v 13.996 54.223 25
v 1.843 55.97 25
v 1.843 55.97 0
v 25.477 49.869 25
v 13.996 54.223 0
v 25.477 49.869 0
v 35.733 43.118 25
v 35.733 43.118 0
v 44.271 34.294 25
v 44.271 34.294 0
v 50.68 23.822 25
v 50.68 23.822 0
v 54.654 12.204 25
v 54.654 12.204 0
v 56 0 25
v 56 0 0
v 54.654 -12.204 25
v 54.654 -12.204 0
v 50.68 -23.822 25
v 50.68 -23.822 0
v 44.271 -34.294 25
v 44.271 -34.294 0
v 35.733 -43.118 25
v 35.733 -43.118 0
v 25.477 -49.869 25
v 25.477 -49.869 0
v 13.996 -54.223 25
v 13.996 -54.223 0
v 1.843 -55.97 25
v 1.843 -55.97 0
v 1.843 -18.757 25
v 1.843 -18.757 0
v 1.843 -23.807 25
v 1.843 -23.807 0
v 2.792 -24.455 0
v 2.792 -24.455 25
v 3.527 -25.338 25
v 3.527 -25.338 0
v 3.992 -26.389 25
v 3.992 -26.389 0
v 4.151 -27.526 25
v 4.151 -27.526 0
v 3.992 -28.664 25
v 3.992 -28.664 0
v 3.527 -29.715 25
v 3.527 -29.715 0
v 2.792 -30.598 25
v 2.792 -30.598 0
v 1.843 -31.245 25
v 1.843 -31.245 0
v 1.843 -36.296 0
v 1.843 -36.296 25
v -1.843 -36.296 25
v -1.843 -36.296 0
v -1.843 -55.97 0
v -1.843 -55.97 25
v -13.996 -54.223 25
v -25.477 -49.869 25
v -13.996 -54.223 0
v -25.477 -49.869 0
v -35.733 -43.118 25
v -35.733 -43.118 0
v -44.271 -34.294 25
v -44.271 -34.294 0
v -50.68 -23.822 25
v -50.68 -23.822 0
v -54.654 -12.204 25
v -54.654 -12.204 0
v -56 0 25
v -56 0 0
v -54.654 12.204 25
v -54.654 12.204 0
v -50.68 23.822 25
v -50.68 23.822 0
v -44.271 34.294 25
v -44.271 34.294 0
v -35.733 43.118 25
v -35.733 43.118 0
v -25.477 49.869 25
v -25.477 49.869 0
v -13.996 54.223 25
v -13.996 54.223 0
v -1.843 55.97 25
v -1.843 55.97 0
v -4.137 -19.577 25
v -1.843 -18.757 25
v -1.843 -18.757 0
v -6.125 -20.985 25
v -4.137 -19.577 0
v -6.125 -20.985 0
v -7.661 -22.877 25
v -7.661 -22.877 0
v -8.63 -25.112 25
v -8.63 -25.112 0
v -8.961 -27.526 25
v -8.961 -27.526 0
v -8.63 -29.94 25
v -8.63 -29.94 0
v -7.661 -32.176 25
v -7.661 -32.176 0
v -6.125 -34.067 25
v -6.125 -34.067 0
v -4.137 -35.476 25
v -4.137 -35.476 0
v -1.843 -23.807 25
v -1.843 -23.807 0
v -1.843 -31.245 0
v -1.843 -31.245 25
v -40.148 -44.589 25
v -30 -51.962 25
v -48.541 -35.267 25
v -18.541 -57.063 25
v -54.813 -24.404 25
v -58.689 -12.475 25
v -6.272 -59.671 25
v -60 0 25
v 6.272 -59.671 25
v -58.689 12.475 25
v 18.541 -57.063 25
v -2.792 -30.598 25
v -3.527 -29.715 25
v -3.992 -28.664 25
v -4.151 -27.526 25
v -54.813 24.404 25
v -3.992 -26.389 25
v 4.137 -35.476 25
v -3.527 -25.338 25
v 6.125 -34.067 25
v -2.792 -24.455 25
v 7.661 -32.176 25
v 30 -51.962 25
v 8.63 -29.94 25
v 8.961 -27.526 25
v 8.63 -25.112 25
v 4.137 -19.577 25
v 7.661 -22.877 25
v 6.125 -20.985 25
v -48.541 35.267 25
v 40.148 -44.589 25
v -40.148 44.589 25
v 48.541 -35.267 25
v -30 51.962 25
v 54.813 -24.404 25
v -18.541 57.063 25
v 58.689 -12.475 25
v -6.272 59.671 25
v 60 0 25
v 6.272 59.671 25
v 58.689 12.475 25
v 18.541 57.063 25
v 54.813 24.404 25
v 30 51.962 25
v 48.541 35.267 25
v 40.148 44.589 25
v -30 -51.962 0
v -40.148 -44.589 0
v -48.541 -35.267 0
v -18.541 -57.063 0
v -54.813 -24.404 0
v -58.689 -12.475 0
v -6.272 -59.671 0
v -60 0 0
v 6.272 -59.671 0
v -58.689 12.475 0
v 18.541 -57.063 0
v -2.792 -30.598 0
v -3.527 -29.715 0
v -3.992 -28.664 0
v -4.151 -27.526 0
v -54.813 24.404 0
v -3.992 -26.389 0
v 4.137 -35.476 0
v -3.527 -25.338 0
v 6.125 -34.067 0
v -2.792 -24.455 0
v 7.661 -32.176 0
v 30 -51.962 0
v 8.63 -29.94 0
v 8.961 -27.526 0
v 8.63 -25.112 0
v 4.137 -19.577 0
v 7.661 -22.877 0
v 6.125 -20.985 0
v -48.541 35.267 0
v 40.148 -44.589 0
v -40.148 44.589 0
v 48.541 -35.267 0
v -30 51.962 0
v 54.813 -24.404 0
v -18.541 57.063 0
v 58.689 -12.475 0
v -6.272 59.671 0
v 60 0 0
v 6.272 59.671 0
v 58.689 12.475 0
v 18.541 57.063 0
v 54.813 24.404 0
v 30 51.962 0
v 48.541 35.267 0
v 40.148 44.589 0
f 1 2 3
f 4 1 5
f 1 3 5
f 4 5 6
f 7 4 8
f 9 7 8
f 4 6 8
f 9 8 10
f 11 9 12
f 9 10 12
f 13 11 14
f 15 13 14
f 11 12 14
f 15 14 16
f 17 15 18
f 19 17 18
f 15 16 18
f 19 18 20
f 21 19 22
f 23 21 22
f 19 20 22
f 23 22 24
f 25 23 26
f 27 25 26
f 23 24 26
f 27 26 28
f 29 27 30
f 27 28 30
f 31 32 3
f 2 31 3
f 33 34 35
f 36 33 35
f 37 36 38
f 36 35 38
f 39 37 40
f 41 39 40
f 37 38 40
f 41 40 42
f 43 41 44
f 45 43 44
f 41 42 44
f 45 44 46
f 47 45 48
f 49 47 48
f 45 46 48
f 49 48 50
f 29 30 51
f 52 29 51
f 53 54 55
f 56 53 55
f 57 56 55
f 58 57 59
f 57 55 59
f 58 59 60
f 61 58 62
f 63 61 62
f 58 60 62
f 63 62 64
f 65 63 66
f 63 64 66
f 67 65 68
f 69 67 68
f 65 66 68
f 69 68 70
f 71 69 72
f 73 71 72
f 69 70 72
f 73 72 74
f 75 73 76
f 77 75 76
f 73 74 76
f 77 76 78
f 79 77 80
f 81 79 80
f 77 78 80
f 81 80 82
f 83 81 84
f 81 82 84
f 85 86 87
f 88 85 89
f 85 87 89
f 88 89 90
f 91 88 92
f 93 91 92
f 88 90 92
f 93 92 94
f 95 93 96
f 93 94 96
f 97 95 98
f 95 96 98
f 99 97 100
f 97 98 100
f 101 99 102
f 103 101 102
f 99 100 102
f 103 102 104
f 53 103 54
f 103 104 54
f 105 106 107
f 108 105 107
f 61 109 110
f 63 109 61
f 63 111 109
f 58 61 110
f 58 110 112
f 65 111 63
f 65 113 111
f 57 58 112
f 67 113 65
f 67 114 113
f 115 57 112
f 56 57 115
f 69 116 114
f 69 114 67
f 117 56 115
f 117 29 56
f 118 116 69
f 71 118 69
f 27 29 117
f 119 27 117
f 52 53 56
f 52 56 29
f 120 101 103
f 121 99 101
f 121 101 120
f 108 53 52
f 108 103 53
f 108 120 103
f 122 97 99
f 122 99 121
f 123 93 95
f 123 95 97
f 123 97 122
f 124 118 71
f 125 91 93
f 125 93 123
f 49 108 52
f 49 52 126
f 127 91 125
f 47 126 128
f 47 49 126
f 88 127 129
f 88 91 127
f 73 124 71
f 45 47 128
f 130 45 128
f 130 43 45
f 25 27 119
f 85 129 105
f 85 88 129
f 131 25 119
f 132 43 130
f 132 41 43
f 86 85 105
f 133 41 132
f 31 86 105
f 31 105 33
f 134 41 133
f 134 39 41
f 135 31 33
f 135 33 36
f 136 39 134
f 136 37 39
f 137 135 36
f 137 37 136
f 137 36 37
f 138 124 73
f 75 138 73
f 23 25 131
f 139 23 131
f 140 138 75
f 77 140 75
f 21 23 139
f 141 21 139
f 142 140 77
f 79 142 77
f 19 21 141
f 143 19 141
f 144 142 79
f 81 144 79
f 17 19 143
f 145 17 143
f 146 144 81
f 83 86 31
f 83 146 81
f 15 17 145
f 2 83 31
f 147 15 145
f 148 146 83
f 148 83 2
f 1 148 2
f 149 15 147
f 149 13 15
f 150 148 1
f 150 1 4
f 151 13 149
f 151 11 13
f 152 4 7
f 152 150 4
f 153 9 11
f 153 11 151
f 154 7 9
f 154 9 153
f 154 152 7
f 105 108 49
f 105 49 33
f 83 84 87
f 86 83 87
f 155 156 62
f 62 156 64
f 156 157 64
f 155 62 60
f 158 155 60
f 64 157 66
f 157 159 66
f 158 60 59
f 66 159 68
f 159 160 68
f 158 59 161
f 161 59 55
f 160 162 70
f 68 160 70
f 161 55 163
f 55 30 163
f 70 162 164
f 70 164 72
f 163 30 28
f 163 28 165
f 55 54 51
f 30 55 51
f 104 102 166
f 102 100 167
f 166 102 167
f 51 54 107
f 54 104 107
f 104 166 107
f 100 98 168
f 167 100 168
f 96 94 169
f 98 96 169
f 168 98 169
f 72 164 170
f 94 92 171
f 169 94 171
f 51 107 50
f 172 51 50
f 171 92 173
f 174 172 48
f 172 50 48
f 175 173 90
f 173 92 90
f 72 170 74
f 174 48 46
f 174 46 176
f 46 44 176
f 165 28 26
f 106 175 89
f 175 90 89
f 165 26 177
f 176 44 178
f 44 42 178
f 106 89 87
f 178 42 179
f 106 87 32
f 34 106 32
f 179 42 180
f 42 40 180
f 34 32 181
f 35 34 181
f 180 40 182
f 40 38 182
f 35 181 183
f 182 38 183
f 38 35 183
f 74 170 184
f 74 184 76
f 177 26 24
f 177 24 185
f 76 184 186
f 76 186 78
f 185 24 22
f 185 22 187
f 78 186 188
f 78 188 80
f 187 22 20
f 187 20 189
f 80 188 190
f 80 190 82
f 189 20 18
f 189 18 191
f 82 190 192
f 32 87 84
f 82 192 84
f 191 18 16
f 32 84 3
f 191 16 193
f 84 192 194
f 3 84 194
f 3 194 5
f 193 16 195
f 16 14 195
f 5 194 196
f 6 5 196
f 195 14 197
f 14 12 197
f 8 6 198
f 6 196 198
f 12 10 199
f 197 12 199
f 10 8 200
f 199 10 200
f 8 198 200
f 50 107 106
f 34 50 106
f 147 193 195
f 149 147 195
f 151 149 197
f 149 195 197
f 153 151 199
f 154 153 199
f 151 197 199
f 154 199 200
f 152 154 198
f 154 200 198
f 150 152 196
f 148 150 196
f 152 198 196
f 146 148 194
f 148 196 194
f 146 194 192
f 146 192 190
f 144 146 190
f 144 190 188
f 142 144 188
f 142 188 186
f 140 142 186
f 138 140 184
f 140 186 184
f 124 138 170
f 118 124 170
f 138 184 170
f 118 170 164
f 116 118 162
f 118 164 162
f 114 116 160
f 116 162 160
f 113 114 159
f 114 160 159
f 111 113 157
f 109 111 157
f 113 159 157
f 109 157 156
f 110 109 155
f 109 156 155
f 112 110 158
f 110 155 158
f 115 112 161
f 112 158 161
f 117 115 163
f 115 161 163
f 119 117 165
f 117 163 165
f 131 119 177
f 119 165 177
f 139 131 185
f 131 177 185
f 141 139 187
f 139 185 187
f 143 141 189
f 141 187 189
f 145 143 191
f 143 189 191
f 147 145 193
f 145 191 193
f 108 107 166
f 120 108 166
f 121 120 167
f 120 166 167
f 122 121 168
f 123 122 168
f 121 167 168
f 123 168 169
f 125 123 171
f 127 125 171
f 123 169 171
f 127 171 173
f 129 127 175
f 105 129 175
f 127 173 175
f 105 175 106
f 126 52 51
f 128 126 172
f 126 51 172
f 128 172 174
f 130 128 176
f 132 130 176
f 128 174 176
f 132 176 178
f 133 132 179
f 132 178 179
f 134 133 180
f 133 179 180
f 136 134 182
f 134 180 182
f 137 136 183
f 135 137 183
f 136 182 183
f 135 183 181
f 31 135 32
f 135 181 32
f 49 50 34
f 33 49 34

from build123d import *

# Parameters (mm, degrees)
F0_R     = 60
F1_DEPTH = 25


with BuildPart() as f1:
    # F0 (on Top) → F1 (new body)
    with BuildSketch(Plane.XY):
        Circle(F0_R)
        with BuildLine():
            ThreePointArc((-1.842674, -31.245442), (-4.150552, -27.526351), (-1.842674, -23.80726))
            Line((-1.842674, -23.80726), (-1.842674, -31.245442))
        make_face(mode=Mode.SUBTRACT)
        with BuildLine():
            ThreePointArc((-1.842674, -55.969675), (-56, 0), (-1.842674, 55.969675))
            Line((-1.842674, 55.969675), (-1.842674, -18.756511))
            ThreePointArc((-1.842674, -18.756511), (-8.961336, -27.526351), (-1.842674, -36.296191))
            Line((-1.842674, -36.296191), (-1.842674, -55.969675))
        make_face(mode=Mode.SUBTRACT)
        with BuildLine():
            Line((1.842674, -31.245442), (1.842674, -23.80726))
            ThreePointArc((1.842674, -23.80726), (4.150552, -27.526351), (1.842674, -31.245442))
        make_face(mode=Mode.SUBTRACT)
        with BuildLine():
            Line((1.842674, -18.756511), (1.842674, 55.969675))
            ThreePointArc((1.842674, 55.969675), (56, 0), (1.842674, -55.969675))
            Line((1.842674, -55.969675), (1.842674, -36.296191))
            ThreePointArc((1.842674, -36.296191), (8.961336, -27.526351), (1.842674, -18.756511))
        make_face(mode=Mode.SUBTRACT)
    extrude(amount=F1_DEPTH)


solid = f1.part
